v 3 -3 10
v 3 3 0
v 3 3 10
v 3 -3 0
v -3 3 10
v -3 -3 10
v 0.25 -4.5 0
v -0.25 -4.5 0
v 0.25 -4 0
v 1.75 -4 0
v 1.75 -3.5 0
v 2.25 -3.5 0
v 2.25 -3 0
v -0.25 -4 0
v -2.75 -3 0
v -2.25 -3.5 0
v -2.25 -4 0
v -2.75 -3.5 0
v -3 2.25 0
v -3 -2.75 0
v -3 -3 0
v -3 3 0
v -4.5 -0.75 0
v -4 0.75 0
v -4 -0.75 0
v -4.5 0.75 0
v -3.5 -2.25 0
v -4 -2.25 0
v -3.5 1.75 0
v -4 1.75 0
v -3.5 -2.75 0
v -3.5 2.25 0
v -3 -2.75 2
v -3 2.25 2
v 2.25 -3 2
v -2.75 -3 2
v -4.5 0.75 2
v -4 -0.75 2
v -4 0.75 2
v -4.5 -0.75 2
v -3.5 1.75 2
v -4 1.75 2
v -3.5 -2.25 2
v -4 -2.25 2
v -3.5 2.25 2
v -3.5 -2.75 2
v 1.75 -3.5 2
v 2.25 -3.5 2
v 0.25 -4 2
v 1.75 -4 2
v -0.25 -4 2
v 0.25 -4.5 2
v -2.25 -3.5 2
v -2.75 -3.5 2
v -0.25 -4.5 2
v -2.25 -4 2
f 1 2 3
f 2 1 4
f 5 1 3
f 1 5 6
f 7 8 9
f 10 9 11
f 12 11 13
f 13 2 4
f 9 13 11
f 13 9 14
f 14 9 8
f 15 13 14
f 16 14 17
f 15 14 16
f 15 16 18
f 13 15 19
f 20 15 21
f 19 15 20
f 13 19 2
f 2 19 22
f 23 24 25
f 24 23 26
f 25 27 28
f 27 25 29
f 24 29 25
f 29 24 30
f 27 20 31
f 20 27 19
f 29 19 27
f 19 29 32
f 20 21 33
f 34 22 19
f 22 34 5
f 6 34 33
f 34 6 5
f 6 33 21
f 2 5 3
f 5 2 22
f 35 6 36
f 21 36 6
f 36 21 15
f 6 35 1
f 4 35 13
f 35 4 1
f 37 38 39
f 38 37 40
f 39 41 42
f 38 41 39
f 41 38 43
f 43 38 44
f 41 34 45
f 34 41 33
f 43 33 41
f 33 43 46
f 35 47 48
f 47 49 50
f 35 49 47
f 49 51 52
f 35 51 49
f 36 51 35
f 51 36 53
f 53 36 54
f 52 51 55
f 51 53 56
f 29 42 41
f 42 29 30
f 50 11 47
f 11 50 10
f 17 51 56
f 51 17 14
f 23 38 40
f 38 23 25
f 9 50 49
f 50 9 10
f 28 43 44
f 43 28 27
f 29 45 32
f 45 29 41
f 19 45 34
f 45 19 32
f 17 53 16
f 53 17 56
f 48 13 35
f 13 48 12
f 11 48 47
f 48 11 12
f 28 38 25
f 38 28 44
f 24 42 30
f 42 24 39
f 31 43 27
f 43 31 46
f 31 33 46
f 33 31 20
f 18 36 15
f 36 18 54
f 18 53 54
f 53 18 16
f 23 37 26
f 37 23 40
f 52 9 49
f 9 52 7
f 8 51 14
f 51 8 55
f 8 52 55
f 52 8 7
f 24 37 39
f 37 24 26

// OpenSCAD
translate([0, 0, 5]) color([0,1,0,0.9]) cube([6, 6, 10], center=true);
translate([-3.25, 0.0, 1]) color([1,0,0]) cube([0.5, 0.5, 2], center=true);
translate([0.0, -3.25, 1]) color([1,0,0]) cube([0.5, 0.5, 2], center=true);
translate([-3.25, -0.5, 1]) color([1,0,0]) cube([0.5, 0.5, 2], center=true);
translate([-3.25, 0.5, 1]) color([1,0,0]) cube([0.5, 0.5, 2], center=true);
translate([-0.5, -3.25, 1]) color([1,0,0]) cube([0.5, 0.5, 2], center=true);
translate([0.5, -3.25, 1]) color([1,0,0]) cube([0.5, 0.5, 2], center=true);
translate([-3.25, -1.0, 1]) color([1,0,0]) cube([0.5, 0.5, 2], center=true);
translate([-3.25, 1.0, 1]) color([1,0,0]) cube([0.5, 0.5, 2], center=true);
translate([-1.0, -3.25, 1]) color([1,0,0]) cube([0.5, 0.5, 2], center=true);
translate([1.0, -3.25, 1]) color([1,0,0]) cube([0.5, 0.5, 2], center=true);
translate([-3.25, -1.5, 1]) color([1,0,0]) cube([0.5, 0.5, 2], center=true);
translate([-3.25, 1.5, 1]) color([1,0,0]) cube([0.5, 0.5, 2], center=true);
translate([-1.5, -3.25, 1]) color([1,0,0]) cube([0.5, 0.5, 2], center=true);
translate([1.5, -3.25, 1]) color([1,0,0]) cube([0.5, 0.5, 2], center=true);
translate([-3.75, 0.0, 1]) color([1,0,0]) cube([0.5, 0.5, 2], center=true);
translate([0.0, -3.75, 1]) color([1,0,0]) cube([0.5, 0.5, 2], center=true);
translate([-3.75, -0.5, 1]) color([1,0,0]) cube([0.5, 0.5, 2], center=true);
translate([-3.75, 0.5, 1]) color([1,0,0]) cube([0.5, 0.5, 2], center=true);
translate([-0.5, -3.75, 1]) color([1,0,0]) cube([0.5, 0.5, 2], center=true);
translate([0.5, -3.75, 1]) color([1,0,0]) cube([0.5, 0.5, 2], center=true);
translate([-3.25, -2.0, 1]) color([1,0,0]) cube([0.5, 0.5, 2], center=true);
translate([-3.25, 2.0, 1]) color([1,0,0]) cube([0.5, 0.5, 2], center=true);
translate([-2.0, -3.25, 1]) color([1,0,0]) cube([0.5, 0.5, 2], center=true);
translate([2.0, -3.25, 1]) color([1,0,0]) cube([0.5, 0.5, 2], center=true);
translate([-3.75, -1.0, 1]) color([1,0,0]) cube([0.5, 0.5, 2], center=true);
translate([-3.75, 1.0, 1]) color([1,0,0]) cube([0.5, 0.5, 2], center=true);
translate([-1.0, -3.75, 1]) color([1,0,0]) cube([0.5, 0.5, 2], center=true);
translate([1.0, -3.75, 1]) color([1,0,0]) cube([0.5, 0.5, 2], center=true);
translate([-3.75, -1.5, 1]) color([1,0,0]) cube([0.5, 0.5, 2], center=true);
translate([-3.75, 1.5, 1]) color([1,0,0]) cube([0.5, 0.5, 2], center=true);
translate([-1.5, -3.75, 1]) color([1,0,0]) cube([0.5, 0.5, 2], center=true);
translate([1.5, -3.75, 1]) color([1,0,0]) cube([0.5, 0.5, 2], center=true);
translate([-3.25, -2.5, 1]) color([1,0,0]) cube([0.5, 0.5, 2], center=true);
translate([-2.5, -3.25, 1]) color([1,0,0]) cube([0.5, 0.5, 2], center=true);
translate([-4.25, 0.0, 1]) color([1,0,0]) cube([0.5, 0.5, 2], center=true);
translate([-3.75, -2.0, 1]) color([1,0,0]) cube([0.5, 0.5, 2], center=true);
translate([-2.0, -3.75, 1]) color([1,0,0]) cube([0.5, 0.5, 2], center=true);
translate([0.0, -4.25, 1]) color([1,0,0]) cube([0.5, 0.5, 2], center=true);
translate([-4.25, -0.5, 1]) color([1,0,0]) cube([0.5, 0.5, 2], center=true);
translate([-4.25, 0.5, 1]) color([1,0,0]) cube([0.5, 0.5, 2], center=true);
